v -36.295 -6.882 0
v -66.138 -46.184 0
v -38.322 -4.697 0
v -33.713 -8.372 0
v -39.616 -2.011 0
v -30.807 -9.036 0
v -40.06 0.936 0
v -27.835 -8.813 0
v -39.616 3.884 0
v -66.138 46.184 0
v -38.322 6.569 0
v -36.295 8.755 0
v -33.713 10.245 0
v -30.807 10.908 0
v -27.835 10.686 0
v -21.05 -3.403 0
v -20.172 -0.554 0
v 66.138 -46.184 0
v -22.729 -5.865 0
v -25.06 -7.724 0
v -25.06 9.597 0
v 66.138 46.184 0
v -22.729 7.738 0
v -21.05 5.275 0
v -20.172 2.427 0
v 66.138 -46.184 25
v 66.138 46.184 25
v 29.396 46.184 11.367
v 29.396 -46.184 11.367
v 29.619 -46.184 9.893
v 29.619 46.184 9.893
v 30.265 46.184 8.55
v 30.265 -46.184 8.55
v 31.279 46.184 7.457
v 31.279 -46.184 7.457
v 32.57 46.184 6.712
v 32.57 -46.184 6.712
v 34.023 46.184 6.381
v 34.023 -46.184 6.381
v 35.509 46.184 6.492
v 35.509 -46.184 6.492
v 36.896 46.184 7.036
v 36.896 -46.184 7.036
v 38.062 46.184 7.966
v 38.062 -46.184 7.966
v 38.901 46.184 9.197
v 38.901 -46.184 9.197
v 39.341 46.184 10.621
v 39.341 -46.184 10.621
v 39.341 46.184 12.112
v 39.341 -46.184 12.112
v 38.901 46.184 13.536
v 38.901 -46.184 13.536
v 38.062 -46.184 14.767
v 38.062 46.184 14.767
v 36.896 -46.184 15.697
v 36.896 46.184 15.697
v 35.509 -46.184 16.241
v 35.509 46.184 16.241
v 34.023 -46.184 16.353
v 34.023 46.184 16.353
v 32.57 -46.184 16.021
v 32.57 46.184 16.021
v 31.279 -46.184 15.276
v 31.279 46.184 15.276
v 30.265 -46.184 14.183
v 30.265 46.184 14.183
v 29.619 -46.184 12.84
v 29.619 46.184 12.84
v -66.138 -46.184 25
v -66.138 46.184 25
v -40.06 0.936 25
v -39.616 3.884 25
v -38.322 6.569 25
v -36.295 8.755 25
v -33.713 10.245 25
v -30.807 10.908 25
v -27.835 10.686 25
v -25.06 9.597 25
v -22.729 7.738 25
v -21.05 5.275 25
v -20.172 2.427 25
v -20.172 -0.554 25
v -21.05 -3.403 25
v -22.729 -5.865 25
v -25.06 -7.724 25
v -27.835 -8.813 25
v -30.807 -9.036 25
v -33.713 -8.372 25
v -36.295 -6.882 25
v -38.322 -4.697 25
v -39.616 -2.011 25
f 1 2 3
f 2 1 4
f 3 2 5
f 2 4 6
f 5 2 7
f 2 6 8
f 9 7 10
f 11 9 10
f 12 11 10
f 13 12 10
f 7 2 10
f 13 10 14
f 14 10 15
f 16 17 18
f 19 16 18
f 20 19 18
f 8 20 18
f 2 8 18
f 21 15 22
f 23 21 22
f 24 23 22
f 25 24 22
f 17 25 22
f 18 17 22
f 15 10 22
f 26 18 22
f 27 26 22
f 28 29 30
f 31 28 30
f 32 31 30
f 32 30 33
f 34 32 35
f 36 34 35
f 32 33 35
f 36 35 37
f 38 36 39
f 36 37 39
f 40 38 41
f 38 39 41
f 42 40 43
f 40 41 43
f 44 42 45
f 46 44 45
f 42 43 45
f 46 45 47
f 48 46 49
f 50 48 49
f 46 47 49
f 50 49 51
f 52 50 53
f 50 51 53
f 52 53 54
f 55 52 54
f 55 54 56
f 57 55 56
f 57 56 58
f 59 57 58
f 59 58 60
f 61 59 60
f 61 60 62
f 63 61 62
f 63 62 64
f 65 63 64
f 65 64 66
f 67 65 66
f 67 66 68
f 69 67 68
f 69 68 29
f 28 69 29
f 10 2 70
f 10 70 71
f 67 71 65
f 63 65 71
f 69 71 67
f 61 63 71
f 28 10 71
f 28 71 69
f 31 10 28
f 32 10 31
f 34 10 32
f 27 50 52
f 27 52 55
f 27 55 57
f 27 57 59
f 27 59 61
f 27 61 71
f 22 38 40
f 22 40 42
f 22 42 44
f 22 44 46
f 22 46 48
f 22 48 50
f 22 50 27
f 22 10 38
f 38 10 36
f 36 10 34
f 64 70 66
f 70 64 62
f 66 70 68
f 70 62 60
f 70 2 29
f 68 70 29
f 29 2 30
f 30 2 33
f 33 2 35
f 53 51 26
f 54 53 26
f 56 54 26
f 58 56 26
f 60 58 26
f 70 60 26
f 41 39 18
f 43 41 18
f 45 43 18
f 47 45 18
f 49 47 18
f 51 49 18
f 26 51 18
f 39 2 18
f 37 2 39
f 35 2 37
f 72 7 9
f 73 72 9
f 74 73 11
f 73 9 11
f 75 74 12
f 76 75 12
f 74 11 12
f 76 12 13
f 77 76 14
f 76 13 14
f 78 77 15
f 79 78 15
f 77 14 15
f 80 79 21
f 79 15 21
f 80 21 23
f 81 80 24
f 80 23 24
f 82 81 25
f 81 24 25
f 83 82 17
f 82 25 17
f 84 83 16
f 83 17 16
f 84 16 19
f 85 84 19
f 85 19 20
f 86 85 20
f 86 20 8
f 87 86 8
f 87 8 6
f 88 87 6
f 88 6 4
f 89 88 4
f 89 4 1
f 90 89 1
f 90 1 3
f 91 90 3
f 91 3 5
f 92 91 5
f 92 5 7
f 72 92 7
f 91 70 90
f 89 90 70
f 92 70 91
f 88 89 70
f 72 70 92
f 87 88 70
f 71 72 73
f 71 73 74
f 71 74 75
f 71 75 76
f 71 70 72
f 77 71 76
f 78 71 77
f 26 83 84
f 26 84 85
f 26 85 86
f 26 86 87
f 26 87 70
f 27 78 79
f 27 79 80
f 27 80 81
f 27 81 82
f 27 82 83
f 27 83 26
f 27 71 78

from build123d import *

# Parameters (mm, degrees)
SKETCH1_W              = 132.276038998
SKETCH1_H              = 92.368395504
BOSS_EXTRUDE1_DEPTH    = 25
F_20_0MM_DOWEL_HOLE1_D = 20
F_10_0MM_DOWEL_HOLE1_D = 10


with BuildPart() as part:
    # Sketch1 → Boss-Extrude1 (new body)
    with BuildSketch(Plane.XY):
        Rectangle(SKETCH1_W, SKETCH1_H)
    extrude(amount=BOSS_EXTRUDE1_DEPTH)

    # Ø20.0mm Dowel Hole1 (through all)
    with Locations(Plane.XY.offset(25)):
        with Locations((-30.059973271, 0.936294249)):
            Hole(F_20_0MM_DOWEL_HOLE1_D / 2)

    # Ø10.0mm Dowel Hole1 (through all)
    with Locations(Plane(origin=(0, 46.184197752, 0), x_dir=(1, 0, 0), z_dir=(0, 1, 0))):
        with Locations((34.396494005, -11.366591172)):
            Hole(F_10_0MM_DOWEL_HOLE1_D / 2)


solid = part.part
